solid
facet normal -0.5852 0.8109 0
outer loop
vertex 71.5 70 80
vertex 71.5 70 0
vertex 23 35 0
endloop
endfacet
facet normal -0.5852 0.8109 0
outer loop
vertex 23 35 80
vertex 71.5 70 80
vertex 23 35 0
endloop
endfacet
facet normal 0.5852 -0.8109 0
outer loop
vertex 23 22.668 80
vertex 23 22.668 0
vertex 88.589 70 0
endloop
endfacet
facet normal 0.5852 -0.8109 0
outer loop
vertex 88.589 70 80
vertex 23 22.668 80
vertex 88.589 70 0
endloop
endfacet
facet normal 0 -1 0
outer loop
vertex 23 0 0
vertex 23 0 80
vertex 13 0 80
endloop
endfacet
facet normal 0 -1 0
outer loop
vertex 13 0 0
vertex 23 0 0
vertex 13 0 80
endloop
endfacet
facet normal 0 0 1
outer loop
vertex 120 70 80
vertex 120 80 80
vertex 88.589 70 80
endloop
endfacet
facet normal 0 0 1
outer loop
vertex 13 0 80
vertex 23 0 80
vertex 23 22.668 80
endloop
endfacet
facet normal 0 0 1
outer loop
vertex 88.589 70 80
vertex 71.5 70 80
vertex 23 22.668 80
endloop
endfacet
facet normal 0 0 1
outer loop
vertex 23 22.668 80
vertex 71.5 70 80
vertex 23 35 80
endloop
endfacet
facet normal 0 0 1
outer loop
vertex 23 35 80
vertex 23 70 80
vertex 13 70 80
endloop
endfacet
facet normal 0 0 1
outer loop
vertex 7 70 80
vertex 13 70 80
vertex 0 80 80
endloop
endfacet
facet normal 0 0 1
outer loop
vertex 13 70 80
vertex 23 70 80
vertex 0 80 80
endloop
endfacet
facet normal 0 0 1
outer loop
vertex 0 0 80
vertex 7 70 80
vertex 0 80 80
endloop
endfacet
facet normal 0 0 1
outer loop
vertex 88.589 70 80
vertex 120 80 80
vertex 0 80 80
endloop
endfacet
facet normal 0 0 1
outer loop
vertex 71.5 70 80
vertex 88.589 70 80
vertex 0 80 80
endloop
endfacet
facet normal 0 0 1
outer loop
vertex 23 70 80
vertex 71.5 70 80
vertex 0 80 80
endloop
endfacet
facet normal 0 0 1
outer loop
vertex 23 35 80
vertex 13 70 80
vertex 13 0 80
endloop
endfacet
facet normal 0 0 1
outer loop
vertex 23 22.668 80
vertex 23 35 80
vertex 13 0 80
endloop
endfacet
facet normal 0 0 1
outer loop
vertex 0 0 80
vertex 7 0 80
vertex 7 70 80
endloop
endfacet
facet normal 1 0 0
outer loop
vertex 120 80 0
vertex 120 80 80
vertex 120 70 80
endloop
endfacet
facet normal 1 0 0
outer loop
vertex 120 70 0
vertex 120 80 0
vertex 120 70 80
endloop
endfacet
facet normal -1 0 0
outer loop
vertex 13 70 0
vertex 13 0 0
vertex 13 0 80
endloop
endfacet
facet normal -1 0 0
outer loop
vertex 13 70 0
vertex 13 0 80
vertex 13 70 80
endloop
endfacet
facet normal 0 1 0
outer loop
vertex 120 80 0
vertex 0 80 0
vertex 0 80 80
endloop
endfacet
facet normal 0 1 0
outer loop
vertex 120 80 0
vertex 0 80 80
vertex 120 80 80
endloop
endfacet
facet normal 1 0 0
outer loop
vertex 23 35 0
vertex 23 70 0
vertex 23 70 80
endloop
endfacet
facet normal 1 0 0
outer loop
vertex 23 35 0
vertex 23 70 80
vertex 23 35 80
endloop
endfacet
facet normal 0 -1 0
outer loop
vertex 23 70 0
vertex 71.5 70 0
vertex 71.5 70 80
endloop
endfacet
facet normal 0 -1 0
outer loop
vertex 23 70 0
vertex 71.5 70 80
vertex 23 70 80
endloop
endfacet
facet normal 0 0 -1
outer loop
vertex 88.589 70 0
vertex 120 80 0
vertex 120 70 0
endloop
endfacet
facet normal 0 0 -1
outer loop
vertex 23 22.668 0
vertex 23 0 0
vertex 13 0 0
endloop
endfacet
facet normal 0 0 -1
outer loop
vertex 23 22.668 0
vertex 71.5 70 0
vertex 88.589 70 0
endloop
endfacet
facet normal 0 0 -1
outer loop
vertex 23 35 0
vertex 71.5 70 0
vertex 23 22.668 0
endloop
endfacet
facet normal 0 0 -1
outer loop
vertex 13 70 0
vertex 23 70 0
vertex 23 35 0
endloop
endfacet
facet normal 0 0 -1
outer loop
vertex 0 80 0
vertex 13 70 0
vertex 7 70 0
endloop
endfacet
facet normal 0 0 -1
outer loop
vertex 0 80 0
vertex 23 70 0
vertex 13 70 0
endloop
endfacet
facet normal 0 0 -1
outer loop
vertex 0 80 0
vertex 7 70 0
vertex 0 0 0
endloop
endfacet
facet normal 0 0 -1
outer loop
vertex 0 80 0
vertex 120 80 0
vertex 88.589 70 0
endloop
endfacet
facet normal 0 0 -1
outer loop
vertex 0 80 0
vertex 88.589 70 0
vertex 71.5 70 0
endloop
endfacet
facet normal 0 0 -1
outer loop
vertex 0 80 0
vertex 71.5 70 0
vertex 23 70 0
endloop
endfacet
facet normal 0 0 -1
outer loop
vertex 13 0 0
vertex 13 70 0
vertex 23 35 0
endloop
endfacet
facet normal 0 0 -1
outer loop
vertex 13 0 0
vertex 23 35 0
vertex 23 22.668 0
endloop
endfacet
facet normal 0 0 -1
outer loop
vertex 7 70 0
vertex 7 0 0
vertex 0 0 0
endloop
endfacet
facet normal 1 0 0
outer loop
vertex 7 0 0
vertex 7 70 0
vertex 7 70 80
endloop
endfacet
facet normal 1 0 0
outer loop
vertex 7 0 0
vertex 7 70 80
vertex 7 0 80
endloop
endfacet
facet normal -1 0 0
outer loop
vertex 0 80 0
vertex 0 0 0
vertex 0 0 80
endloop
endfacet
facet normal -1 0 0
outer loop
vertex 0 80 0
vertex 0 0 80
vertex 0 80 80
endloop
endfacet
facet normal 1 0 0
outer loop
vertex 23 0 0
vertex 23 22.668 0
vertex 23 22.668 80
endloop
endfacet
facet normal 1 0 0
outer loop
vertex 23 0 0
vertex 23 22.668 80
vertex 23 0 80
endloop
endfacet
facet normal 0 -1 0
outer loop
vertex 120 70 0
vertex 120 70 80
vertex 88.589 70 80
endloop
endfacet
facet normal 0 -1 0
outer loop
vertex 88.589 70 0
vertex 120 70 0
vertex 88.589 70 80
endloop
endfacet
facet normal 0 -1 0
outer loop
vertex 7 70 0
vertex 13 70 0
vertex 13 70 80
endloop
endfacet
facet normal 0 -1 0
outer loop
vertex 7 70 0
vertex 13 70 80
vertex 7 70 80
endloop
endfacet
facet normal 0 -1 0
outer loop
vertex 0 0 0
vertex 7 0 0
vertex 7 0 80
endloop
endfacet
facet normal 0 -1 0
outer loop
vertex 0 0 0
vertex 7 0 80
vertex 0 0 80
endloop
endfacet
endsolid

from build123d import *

# Parameters (mm, degrees)
BOSS_EXTRU_1_DEPTH = 80
BOSS_EXTRU_3_DEPTH = 80


with BuildPart() as part:
    # Esquisse1 → Boss.-Extru.1 (new body)
    with BuildSketch(Plane.XY):
        Polygon((0, 0), (0, 80), (120, 80), (120, 70), (23, 70), (23, 0), (13, 0), (13, 70), (7, 70), (7, 0), align=None)
    extrude(amount=BOSS_EXTRU_1_DEPTH)

    # Esquisse2 → Boss.-Extru.3 (add)
    with BuildSketch(Plane(origin=(0, 0, 0), x_dir=(-1, 0, 0), z_dir=(0, 0, -1))):
        Polygon((-71.5, 70), (-23, 35), (-23, 22.668017278), (-88.588604629, 70), align=None)
    extrude(amount=-BOSS_EXTRU_3_DEPTH)


solid = part.part
